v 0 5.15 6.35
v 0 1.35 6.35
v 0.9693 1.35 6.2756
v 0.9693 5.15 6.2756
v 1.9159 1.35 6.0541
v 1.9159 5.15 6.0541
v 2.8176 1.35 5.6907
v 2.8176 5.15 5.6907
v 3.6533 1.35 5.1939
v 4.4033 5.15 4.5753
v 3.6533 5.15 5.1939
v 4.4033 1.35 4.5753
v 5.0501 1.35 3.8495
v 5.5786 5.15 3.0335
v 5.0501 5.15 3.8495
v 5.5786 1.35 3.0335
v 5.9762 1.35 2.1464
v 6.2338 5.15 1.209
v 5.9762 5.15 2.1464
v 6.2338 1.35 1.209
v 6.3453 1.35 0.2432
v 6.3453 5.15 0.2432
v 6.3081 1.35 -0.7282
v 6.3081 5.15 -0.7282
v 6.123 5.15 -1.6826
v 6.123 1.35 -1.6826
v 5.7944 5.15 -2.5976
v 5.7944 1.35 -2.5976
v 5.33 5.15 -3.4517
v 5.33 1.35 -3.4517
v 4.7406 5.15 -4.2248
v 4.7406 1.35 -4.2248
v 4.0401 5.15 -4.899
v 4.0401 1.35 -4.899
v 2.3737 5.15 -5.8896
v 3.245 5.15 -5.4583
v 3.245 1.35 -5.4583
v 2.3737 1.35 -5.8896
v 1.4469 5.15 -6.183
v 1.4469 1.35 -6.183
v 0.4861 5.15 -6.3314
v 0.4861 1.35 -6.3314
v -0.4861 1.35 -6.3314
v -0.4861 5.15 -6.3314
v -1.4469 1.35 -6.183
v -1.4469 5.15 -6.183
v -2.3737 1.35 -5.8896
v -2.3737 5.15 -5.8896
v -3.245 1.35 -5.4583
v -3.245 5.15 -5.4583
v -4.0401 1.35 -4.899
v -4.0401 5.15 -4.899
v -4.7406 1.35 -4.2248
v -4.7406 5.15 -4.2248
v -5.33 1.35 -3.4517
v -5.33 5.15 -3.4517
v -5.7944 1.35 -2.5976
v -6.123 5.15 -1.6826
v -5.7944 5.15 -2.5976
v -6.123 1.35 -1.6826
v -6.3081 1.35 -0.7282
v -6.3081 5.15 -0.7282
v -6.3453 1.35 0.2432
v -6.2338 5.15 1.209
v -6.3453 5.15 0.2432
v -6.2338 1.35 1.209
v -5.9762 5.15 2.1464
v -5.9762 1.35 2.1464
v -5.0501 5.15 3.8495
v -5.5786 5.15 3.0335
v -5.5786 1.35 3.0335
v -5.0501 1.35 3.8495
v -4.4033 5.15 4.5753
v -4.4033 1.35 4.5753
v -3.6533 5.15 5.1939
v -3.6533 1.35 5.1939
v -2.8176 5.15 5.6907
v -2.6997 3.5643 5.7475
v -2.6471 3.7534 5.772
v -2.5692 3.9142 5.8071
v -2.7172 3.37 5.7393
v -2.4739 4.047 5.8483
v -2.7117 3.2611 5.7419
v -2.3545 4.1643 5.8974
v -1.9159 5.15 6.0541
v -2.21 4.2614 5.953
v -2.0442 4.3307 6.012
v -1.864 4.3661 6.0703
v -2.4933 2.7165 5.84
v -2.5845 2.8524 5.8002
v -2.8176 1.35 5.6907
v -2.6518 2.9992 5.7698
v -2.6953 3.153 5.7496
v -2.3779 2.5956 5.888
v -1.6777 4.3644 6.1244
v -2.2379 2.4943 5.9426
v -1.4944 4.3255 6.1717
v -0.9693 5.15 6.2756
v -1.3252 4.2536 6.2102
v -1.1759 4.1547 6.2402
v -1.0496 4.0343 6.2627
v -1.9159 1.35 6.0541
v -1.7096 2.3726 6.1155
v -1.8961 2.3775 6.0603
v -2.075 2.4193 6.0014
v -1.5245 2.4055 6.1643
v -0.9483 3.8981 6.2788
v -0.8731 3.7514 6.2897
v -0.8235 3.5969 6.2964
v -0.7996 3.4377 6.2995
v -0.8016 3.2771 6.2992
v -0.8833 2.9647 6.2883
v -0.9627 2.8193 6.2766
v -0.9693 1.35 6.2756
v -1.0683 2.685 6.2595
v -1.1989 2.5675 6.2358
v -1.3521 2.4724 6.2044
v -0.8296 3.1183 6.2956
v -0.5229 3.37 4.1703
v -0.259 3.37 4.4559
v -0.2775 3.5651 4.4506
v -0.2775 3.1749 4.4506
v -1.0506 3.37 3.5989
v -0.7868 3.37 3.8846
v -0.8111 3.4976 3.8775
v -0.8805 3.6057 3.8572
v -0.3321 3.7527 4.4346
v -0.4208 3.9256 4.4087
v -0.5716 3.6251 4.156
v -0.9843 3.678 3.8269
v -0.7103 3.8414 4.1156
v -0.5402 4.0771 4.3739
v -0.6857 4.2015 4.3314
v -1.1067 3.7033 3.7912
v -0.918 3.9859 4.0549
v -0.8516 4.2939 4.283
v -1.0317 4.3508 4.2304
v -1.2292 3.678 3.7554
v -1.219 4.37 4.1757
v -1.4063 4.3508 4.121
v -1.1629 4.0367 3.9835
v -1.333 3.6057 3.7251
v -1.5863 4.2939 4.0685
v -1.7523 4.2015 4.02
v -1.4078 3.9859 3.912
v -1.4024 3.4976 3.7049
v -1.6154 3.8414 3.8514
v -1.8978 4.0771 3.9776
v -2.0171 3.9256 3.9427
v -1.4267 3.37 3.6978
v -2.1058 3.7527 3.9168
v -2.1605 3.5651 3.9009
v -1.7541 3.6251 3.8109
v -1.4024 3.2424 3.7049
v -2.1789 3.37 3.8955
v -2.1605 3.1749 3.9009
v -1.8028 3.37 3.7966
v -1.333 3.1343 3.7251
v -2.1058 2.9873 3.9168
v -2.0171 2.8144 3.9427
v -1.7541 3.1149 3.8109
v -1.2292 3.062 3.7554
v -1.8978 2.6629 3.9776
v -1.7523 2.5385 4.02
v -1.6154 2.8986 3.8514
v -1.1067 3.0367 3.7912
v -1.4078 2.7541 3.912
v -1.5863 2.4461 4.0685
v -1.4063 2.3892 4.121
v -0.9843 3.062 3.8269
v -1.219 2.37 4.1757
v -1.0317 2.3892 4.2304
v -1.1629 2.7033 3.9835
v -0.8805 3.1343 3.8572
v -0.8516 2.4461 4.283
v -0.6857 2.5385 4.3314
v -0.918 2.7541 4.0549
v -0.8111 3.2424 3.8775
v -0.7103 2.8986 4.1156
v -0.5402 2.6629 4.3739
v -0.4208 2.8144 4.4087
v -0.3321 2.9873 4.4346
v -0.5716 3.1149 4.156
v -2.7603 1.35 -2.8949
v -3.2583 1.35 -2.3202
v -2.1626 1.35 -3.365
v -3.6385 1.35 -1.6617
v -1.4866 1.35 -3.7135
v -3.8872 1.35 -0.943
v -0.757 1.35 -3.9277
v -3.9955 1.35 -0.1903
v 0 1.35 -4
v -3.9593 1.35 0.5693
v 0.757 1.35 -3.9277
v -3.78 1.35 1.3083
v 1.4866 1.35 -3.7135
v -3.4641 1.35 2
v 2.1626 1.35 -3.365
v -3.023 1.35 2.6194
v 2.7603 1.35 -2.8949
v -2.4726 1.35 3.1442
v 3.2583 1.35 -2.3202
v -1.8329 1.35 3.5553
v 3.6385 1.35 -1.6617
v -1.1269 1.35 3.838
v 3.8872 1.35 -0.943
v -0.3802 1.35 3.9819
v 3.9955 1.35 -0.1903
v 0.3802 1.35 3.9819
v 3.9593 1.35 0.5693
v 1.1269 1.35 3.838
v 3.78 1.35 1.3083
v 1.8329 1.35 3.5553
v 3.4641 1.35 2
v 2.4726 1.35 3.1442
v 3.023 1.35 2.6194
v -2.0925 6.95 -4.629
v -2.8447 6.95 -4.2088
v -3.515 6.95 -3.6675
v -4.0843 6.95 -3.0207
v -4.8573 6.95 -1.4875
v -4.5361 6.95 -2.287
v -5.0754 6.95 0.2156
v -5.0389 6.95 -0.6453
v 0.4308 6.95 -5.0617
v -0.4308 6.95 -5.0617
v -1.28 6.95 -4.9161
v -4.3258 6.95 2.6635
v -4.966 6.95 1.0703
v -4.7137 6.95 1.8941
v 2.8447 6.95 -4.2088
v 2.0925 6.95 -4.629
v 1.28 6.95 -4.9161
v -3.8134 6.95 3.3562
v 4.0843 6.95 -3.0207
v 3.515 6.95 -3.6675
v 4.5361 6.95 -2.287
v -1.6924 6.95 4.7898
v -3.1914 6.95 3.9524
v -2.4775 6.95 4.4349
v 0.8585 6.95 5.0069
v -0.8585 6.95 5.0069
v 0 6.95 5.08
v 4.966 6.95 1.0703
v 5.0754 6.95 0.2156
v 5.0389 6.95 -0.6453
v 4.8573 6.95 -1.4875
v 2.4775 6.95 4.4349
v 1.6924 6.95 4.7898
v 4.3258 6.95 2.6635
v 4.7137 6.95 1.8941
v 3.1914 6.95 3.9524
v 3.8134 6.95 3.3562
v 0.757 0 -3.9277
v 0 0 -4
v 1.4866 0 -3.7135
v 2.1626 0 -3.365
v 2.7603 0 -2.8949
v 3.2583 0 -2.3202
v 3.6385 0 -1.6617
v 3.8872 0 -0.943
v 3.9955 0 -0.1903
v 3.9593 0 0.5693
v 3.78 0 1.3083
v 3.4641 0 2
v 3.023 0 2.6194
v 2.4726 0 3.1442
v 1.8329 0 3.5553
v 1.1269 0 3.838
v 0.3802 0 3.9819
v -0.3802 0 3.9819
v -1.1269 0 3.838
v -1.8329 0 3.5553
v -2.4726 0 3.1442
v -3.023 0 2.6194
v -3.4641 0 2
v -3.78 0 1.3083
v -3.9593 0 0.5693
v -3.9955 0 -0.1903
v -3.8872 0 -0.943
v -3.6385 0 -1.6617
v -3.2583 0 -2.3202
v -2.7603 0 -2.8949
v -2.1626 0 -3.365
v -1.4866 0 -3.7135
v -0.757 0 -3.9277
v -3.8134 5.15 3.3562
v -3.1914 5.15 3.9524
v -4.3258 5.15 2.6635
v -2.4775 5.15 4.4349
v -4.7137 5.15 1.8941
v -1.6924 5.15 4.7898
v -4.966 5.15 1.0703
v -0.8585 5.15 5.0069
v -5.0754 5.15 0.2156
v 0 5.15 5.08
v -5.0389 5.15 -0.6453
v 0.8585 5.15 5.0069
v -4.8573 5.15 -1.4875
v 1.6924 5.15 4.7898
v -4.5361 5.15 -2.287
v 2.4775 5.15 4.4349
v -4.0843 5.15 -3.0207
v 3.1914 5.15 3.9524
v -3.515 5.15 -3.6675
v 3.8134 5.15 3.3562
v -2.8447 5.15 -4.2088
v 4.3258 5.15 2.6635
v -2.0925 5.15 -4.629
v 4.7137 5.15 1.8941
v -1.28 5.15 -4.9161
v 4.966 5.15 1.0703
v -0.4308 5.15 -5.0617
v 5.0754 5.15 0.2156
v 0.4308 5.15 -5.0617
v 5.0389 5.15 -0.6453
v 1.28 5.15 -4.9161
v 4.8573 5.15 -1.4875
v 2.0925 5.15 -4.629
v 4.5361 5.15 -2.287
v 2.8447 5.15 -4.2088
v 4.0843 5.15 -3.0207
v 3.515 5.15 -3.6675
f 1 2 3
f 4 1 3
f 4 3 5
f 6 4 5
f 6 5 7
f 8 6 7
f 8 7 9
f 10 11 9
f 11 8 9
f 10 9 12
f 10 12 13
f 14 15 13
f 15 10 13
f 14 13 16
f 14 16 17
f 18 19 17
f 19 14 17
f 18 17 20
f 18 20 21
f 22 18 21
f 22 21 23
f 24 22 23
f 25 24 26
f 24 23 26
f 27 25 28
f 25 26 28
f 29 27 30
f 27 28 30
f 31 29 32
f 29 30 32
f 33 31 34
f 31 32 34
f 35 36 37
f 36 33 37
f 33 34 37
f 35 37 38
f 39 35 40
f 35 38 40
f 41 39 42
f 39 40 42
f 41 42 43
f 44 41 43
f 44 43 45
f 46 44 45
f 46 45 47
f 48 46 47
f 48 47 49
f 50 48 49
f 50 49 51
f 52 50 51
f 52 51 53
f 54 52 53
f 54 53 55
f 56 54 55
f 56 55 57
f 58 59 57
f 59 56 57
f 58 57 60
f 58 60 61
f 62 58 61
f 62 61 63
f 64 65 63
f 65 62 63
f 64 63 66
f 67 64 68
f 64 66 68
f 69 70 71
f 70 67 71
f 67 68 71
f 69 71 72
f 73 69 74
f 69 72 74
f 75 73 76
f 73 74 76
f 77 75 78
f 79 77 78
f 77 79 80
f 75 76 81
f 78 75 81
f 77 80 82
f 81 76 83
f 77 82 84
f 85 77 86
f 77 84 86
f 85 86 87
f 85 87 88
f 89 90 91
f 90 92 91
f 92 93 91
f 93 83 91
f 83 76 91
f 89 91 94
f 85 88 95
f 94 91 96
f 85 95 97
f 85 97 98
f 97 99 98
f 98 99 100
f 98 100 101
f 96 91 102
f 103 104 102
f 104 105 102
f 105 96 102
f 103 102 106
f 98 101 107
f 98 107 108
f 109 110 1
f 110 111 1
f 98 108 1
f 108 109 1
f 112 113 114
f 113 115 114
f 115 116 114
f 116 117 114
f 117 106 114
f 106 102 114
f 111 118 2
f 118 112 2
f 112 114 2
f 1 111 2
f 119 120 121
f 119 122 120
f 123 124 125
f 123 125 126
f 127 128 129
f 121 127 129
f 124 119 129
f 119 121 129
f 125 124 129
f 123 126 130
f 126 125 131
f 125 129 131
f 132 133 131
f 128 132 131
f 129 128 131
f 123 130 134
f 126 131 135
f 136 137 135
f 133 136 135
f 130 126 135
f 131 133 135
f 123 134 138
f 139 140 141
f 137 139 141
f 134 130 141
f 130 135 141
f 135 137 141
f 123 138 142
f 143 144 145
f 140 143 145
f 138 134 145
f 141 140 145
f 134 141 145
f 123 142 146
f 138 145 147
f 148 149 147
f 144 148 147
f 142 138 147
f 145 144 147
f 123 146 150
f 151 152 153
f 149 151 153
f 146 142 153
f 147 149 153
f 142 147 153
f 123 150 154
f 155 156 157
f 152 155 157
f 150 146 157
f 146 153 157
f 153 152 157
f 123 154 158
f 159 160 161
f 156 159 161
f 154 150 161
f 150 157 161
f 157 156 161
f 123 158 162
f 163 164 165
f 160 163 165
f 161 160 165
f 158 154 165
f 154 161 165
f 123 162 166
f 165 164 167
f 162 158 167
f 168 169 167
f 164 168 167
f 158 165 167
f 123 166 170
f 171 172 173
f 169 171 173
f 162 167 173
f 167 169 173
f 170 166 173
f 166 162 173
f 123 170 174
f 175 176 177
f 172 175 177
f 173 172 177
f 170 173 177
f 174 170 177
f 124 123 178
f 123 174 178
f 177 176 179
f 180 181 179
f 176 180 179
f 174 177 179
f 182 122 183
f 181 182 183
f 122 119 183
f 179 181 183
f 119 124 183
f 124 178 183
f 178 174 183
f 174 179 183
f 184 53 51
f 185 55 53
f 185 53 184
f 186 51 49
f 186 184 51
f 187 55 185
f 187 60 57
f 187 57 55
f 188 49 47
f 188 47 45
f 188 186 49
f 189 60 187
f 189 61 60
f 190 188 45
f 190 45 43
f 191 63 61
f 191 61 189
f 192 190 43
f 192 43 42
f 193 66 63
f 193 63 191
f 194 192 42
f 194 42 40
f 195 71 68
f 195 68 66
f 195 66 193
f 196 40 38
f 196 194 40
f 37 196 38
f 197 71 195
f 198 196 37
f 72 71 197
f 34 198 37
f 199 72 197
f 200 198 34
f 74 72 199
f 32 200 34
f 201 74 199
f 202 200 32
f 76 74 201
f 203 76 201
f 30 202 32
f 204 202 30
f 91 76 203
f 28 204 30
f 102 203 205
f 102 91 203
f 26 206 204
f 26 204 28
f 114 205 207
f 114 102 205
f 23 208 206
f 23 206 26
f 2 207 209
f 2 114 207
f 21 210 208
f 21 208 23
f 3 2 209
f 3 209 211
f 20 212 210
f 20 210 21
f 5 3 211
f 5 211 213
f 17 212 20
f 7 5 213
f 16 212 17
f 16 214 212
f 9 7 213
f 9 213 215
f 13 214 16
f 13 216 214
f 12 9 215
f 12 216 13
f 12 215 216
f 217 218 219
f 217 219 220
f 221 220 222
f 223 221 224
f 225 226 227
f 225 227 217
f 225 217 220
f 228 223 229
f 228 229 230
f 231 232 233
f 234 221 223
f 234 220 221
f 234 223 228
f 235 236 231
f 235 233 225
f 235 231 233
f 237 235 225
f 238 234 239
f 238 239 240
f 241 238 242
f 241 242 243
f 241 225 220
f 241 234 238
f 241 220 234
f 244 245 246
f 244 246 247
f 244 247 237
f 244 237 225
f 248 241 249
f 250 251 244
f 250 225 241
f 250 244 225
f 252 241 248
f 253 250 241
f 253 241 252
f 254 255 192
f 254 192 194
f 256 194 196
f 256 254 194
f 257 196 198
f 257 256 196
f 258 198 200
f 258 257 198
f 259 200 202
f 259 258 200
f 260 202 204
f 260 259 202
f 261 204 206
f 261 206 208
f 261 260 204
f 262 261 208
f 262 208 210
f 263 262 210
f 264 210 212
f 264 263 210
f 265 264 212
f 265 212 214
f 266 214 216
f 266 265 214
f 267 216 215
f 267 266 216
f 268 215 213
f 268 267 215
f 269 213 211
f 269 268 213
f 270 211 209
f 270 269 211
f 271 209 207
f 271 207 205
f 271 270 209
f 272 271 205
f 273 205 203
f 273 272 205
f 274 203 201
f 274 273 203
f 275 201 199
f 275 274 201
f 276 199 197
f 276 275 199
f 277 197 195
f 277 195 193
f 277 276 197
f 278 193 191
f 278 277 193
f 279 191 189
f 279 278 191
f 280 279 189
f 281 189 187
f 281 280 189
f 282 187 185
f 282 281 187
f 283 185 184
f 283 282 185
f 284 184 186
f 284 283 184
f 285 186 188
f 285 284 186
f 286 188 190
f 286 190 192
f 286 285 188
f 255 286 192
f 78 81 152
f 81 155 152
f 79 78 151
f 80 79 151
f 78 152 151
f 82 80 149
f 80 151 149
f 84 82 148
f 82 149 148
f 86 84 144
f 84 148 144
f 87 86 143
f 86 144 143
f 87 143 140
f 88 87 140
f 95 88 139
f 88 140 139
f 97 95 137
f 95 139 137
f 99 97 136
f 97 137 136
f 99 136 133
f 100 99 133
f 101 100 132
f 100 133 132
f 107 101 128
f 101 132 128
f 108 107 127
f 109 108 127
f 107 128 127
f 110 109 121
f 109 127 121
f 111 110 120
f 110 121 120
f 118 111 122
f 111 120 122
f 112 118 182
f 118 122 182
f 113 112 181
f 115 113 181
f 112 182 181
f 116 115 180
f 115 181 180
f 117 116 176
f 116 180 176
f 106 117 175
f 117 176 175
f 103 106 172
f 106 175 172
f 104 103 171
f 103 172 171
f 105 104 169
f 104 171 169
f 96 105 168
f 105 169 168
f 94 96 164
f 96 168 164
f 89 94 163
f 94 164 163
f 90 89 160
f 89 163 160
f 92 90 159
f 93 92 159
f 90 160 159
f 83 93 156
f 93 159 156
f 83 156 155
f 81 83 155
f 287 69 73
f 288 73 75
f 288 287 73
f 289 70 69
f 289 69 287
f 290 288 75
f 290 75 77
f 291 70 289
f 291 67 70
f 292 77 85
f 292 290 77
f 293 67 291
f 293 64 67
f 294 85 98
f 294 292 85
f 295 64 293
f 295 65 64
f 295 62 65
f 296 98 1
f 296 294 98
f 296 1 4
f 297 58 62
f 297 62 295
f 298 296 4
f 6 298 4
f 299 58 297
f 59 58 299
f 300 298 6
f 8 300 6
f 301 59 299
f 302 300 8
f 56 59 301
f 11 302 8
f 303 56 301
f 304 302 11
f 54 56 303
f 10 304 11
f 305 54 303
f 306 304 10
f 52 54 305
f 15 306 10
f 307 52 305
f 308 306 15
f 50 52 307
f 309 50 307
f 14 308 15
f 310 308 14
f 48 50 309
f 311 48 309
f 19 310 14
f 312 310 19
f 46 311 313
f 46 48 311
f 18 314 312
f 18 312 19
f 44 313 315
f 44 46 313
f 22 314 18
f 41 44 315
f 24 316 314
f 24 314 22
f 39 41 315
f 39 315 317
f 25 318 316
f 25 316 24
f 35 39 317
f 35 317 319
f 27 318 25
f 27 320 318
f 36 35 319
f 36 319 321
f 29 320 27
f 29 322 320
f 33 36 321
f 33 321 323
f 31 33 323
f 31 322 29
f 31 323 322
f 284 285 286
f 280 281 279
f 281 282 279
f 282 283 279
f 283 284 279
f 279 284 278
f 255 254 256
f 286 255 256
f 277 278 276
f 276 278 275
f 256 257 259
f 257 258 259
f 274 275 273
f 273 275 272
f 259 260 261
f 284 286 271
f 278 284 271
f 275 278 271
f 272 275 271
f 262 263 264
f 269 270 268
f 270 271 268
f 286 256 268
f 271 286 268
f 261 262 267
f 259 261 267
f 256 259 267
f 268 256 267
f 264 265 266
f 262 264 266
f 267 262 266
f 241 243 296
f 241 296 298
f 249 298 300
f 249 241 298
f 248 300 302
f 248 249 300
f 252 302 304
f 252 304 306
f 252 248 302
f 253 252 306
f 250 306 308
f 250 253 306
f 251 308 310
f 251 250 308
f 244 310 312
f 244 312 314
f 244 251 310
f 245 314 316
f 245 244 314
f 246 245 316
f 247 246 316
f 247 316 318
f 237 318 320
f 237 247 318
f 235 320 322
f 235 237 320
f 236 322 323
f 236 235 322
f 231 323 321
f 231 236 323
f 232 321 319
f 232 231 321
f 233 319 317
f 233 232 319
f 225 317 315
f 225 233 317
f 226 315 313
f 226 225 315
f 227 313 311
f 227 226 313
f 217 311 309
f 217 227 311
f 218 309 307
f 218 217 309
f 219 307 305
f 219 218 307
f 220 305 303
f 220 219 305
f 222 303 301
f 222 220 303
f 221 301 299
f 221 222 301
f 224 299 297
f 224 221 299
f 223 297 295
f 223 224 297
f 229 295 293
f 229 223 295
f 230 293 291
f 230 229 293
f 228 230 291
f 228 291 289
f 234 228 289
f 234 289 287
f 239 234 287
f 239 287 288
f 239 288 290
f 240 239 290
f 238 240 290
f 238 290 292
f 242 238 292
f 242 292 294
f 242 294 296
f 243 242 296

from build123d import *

# Parameters (mm, degrees)
SKETCH1_R                 = 6.35
BOSS_EXTRUDE1_DEPTH       = 6.95
SKETCH2_R                 = 7.542662581
SKETCH2_R_2               = 4
CUT_EXTRUDE1_DEPTH        = 1.35
SKETCH3_R                 = 7.419476018
SKETCH3_R_2               = 5.08
CUT_EXTRUDE2_DEPTH        = 1.8
F_2_0MM_DOWEL_HOLE1_D     = 2
F_2_0MM_DOWEL_HOLE1_DEPTH = 2
F_2_0MM_DOWEL_HOLE1_TIP   = 0.600860619


with BuildPart() as part:
    # Sketch1 → Boss-Extrude1 (new body)
    with BuildSketch(Plane(origin=(0, 0, 0), x_dir=(1, 0, 0), z_dir=(0, 1, 0))):
        with Locations(Location((0, 0, 0), (0, 0, 270))):
            Circle(SKETCH1_R)
    extrude(amount=BOSS_EXTRUDE1_DEPTH)

    # Sketch2 → Cut-Extrude1 (cut)
    with BuildSketch(Plane.XZ):
        Circle(SKETCH2_R)
        with Locations(Location((0, 0, 0), (0, 0, 270))):
            Circle(SKETCH2_R_2, mode=Mode.SUBTRACT)
    extrude(amount=-CUT_EXTRUDE1_DEPTH, mode=Mode.SUBTRACT)

    # Sketch3 → Cut-Extrude2 (cut)
    with BuildSketch(Plane(origin=(0, 6.95, 0), x_dir=(1, 0, 0), z_dir=(0, 1, 0))):
        Circle(SKETCH3_R)
        with Locations(Location((0, 0, 0), (0, 0, 270))):
            Circle(SKETCH3_R_2, mode=Mode.SUBTRACT)
    extrude(amount=-CUT_EXTRUDE2_DEPTH, mode=Mode.SUBTRACT)

    # Ø2.0mm Dowel Hole1
    with Locations(Plane(origin=(-1.779430565, 3.37, 6.09558257), x_dir=(0.95993426294, 0, 0.280225285859), z_dir=(-0.280225285859, 0, 0.95993426294))):
        with Locations((0, 0)):
            Hole(F_2_0MM_DOWEL_HOLE1_D / 2, depth=F_2_0MM_DOWEL_HOLE1_DEPTH)
            with Locations((0, 0, -(F_2_0MM_DOWEL_HOLE1_DEPTH + F_2_0MM_DOWEL_HOLE1_TIP / 2))):  # 118° drill point
                Cone(0, F_2_0MM_DOWEL_HOLE1_D / 2, F_2_0MM_DOWEL_HOLE1_TIP, mode=Mode.SUBTRACT)


solid = part.part
